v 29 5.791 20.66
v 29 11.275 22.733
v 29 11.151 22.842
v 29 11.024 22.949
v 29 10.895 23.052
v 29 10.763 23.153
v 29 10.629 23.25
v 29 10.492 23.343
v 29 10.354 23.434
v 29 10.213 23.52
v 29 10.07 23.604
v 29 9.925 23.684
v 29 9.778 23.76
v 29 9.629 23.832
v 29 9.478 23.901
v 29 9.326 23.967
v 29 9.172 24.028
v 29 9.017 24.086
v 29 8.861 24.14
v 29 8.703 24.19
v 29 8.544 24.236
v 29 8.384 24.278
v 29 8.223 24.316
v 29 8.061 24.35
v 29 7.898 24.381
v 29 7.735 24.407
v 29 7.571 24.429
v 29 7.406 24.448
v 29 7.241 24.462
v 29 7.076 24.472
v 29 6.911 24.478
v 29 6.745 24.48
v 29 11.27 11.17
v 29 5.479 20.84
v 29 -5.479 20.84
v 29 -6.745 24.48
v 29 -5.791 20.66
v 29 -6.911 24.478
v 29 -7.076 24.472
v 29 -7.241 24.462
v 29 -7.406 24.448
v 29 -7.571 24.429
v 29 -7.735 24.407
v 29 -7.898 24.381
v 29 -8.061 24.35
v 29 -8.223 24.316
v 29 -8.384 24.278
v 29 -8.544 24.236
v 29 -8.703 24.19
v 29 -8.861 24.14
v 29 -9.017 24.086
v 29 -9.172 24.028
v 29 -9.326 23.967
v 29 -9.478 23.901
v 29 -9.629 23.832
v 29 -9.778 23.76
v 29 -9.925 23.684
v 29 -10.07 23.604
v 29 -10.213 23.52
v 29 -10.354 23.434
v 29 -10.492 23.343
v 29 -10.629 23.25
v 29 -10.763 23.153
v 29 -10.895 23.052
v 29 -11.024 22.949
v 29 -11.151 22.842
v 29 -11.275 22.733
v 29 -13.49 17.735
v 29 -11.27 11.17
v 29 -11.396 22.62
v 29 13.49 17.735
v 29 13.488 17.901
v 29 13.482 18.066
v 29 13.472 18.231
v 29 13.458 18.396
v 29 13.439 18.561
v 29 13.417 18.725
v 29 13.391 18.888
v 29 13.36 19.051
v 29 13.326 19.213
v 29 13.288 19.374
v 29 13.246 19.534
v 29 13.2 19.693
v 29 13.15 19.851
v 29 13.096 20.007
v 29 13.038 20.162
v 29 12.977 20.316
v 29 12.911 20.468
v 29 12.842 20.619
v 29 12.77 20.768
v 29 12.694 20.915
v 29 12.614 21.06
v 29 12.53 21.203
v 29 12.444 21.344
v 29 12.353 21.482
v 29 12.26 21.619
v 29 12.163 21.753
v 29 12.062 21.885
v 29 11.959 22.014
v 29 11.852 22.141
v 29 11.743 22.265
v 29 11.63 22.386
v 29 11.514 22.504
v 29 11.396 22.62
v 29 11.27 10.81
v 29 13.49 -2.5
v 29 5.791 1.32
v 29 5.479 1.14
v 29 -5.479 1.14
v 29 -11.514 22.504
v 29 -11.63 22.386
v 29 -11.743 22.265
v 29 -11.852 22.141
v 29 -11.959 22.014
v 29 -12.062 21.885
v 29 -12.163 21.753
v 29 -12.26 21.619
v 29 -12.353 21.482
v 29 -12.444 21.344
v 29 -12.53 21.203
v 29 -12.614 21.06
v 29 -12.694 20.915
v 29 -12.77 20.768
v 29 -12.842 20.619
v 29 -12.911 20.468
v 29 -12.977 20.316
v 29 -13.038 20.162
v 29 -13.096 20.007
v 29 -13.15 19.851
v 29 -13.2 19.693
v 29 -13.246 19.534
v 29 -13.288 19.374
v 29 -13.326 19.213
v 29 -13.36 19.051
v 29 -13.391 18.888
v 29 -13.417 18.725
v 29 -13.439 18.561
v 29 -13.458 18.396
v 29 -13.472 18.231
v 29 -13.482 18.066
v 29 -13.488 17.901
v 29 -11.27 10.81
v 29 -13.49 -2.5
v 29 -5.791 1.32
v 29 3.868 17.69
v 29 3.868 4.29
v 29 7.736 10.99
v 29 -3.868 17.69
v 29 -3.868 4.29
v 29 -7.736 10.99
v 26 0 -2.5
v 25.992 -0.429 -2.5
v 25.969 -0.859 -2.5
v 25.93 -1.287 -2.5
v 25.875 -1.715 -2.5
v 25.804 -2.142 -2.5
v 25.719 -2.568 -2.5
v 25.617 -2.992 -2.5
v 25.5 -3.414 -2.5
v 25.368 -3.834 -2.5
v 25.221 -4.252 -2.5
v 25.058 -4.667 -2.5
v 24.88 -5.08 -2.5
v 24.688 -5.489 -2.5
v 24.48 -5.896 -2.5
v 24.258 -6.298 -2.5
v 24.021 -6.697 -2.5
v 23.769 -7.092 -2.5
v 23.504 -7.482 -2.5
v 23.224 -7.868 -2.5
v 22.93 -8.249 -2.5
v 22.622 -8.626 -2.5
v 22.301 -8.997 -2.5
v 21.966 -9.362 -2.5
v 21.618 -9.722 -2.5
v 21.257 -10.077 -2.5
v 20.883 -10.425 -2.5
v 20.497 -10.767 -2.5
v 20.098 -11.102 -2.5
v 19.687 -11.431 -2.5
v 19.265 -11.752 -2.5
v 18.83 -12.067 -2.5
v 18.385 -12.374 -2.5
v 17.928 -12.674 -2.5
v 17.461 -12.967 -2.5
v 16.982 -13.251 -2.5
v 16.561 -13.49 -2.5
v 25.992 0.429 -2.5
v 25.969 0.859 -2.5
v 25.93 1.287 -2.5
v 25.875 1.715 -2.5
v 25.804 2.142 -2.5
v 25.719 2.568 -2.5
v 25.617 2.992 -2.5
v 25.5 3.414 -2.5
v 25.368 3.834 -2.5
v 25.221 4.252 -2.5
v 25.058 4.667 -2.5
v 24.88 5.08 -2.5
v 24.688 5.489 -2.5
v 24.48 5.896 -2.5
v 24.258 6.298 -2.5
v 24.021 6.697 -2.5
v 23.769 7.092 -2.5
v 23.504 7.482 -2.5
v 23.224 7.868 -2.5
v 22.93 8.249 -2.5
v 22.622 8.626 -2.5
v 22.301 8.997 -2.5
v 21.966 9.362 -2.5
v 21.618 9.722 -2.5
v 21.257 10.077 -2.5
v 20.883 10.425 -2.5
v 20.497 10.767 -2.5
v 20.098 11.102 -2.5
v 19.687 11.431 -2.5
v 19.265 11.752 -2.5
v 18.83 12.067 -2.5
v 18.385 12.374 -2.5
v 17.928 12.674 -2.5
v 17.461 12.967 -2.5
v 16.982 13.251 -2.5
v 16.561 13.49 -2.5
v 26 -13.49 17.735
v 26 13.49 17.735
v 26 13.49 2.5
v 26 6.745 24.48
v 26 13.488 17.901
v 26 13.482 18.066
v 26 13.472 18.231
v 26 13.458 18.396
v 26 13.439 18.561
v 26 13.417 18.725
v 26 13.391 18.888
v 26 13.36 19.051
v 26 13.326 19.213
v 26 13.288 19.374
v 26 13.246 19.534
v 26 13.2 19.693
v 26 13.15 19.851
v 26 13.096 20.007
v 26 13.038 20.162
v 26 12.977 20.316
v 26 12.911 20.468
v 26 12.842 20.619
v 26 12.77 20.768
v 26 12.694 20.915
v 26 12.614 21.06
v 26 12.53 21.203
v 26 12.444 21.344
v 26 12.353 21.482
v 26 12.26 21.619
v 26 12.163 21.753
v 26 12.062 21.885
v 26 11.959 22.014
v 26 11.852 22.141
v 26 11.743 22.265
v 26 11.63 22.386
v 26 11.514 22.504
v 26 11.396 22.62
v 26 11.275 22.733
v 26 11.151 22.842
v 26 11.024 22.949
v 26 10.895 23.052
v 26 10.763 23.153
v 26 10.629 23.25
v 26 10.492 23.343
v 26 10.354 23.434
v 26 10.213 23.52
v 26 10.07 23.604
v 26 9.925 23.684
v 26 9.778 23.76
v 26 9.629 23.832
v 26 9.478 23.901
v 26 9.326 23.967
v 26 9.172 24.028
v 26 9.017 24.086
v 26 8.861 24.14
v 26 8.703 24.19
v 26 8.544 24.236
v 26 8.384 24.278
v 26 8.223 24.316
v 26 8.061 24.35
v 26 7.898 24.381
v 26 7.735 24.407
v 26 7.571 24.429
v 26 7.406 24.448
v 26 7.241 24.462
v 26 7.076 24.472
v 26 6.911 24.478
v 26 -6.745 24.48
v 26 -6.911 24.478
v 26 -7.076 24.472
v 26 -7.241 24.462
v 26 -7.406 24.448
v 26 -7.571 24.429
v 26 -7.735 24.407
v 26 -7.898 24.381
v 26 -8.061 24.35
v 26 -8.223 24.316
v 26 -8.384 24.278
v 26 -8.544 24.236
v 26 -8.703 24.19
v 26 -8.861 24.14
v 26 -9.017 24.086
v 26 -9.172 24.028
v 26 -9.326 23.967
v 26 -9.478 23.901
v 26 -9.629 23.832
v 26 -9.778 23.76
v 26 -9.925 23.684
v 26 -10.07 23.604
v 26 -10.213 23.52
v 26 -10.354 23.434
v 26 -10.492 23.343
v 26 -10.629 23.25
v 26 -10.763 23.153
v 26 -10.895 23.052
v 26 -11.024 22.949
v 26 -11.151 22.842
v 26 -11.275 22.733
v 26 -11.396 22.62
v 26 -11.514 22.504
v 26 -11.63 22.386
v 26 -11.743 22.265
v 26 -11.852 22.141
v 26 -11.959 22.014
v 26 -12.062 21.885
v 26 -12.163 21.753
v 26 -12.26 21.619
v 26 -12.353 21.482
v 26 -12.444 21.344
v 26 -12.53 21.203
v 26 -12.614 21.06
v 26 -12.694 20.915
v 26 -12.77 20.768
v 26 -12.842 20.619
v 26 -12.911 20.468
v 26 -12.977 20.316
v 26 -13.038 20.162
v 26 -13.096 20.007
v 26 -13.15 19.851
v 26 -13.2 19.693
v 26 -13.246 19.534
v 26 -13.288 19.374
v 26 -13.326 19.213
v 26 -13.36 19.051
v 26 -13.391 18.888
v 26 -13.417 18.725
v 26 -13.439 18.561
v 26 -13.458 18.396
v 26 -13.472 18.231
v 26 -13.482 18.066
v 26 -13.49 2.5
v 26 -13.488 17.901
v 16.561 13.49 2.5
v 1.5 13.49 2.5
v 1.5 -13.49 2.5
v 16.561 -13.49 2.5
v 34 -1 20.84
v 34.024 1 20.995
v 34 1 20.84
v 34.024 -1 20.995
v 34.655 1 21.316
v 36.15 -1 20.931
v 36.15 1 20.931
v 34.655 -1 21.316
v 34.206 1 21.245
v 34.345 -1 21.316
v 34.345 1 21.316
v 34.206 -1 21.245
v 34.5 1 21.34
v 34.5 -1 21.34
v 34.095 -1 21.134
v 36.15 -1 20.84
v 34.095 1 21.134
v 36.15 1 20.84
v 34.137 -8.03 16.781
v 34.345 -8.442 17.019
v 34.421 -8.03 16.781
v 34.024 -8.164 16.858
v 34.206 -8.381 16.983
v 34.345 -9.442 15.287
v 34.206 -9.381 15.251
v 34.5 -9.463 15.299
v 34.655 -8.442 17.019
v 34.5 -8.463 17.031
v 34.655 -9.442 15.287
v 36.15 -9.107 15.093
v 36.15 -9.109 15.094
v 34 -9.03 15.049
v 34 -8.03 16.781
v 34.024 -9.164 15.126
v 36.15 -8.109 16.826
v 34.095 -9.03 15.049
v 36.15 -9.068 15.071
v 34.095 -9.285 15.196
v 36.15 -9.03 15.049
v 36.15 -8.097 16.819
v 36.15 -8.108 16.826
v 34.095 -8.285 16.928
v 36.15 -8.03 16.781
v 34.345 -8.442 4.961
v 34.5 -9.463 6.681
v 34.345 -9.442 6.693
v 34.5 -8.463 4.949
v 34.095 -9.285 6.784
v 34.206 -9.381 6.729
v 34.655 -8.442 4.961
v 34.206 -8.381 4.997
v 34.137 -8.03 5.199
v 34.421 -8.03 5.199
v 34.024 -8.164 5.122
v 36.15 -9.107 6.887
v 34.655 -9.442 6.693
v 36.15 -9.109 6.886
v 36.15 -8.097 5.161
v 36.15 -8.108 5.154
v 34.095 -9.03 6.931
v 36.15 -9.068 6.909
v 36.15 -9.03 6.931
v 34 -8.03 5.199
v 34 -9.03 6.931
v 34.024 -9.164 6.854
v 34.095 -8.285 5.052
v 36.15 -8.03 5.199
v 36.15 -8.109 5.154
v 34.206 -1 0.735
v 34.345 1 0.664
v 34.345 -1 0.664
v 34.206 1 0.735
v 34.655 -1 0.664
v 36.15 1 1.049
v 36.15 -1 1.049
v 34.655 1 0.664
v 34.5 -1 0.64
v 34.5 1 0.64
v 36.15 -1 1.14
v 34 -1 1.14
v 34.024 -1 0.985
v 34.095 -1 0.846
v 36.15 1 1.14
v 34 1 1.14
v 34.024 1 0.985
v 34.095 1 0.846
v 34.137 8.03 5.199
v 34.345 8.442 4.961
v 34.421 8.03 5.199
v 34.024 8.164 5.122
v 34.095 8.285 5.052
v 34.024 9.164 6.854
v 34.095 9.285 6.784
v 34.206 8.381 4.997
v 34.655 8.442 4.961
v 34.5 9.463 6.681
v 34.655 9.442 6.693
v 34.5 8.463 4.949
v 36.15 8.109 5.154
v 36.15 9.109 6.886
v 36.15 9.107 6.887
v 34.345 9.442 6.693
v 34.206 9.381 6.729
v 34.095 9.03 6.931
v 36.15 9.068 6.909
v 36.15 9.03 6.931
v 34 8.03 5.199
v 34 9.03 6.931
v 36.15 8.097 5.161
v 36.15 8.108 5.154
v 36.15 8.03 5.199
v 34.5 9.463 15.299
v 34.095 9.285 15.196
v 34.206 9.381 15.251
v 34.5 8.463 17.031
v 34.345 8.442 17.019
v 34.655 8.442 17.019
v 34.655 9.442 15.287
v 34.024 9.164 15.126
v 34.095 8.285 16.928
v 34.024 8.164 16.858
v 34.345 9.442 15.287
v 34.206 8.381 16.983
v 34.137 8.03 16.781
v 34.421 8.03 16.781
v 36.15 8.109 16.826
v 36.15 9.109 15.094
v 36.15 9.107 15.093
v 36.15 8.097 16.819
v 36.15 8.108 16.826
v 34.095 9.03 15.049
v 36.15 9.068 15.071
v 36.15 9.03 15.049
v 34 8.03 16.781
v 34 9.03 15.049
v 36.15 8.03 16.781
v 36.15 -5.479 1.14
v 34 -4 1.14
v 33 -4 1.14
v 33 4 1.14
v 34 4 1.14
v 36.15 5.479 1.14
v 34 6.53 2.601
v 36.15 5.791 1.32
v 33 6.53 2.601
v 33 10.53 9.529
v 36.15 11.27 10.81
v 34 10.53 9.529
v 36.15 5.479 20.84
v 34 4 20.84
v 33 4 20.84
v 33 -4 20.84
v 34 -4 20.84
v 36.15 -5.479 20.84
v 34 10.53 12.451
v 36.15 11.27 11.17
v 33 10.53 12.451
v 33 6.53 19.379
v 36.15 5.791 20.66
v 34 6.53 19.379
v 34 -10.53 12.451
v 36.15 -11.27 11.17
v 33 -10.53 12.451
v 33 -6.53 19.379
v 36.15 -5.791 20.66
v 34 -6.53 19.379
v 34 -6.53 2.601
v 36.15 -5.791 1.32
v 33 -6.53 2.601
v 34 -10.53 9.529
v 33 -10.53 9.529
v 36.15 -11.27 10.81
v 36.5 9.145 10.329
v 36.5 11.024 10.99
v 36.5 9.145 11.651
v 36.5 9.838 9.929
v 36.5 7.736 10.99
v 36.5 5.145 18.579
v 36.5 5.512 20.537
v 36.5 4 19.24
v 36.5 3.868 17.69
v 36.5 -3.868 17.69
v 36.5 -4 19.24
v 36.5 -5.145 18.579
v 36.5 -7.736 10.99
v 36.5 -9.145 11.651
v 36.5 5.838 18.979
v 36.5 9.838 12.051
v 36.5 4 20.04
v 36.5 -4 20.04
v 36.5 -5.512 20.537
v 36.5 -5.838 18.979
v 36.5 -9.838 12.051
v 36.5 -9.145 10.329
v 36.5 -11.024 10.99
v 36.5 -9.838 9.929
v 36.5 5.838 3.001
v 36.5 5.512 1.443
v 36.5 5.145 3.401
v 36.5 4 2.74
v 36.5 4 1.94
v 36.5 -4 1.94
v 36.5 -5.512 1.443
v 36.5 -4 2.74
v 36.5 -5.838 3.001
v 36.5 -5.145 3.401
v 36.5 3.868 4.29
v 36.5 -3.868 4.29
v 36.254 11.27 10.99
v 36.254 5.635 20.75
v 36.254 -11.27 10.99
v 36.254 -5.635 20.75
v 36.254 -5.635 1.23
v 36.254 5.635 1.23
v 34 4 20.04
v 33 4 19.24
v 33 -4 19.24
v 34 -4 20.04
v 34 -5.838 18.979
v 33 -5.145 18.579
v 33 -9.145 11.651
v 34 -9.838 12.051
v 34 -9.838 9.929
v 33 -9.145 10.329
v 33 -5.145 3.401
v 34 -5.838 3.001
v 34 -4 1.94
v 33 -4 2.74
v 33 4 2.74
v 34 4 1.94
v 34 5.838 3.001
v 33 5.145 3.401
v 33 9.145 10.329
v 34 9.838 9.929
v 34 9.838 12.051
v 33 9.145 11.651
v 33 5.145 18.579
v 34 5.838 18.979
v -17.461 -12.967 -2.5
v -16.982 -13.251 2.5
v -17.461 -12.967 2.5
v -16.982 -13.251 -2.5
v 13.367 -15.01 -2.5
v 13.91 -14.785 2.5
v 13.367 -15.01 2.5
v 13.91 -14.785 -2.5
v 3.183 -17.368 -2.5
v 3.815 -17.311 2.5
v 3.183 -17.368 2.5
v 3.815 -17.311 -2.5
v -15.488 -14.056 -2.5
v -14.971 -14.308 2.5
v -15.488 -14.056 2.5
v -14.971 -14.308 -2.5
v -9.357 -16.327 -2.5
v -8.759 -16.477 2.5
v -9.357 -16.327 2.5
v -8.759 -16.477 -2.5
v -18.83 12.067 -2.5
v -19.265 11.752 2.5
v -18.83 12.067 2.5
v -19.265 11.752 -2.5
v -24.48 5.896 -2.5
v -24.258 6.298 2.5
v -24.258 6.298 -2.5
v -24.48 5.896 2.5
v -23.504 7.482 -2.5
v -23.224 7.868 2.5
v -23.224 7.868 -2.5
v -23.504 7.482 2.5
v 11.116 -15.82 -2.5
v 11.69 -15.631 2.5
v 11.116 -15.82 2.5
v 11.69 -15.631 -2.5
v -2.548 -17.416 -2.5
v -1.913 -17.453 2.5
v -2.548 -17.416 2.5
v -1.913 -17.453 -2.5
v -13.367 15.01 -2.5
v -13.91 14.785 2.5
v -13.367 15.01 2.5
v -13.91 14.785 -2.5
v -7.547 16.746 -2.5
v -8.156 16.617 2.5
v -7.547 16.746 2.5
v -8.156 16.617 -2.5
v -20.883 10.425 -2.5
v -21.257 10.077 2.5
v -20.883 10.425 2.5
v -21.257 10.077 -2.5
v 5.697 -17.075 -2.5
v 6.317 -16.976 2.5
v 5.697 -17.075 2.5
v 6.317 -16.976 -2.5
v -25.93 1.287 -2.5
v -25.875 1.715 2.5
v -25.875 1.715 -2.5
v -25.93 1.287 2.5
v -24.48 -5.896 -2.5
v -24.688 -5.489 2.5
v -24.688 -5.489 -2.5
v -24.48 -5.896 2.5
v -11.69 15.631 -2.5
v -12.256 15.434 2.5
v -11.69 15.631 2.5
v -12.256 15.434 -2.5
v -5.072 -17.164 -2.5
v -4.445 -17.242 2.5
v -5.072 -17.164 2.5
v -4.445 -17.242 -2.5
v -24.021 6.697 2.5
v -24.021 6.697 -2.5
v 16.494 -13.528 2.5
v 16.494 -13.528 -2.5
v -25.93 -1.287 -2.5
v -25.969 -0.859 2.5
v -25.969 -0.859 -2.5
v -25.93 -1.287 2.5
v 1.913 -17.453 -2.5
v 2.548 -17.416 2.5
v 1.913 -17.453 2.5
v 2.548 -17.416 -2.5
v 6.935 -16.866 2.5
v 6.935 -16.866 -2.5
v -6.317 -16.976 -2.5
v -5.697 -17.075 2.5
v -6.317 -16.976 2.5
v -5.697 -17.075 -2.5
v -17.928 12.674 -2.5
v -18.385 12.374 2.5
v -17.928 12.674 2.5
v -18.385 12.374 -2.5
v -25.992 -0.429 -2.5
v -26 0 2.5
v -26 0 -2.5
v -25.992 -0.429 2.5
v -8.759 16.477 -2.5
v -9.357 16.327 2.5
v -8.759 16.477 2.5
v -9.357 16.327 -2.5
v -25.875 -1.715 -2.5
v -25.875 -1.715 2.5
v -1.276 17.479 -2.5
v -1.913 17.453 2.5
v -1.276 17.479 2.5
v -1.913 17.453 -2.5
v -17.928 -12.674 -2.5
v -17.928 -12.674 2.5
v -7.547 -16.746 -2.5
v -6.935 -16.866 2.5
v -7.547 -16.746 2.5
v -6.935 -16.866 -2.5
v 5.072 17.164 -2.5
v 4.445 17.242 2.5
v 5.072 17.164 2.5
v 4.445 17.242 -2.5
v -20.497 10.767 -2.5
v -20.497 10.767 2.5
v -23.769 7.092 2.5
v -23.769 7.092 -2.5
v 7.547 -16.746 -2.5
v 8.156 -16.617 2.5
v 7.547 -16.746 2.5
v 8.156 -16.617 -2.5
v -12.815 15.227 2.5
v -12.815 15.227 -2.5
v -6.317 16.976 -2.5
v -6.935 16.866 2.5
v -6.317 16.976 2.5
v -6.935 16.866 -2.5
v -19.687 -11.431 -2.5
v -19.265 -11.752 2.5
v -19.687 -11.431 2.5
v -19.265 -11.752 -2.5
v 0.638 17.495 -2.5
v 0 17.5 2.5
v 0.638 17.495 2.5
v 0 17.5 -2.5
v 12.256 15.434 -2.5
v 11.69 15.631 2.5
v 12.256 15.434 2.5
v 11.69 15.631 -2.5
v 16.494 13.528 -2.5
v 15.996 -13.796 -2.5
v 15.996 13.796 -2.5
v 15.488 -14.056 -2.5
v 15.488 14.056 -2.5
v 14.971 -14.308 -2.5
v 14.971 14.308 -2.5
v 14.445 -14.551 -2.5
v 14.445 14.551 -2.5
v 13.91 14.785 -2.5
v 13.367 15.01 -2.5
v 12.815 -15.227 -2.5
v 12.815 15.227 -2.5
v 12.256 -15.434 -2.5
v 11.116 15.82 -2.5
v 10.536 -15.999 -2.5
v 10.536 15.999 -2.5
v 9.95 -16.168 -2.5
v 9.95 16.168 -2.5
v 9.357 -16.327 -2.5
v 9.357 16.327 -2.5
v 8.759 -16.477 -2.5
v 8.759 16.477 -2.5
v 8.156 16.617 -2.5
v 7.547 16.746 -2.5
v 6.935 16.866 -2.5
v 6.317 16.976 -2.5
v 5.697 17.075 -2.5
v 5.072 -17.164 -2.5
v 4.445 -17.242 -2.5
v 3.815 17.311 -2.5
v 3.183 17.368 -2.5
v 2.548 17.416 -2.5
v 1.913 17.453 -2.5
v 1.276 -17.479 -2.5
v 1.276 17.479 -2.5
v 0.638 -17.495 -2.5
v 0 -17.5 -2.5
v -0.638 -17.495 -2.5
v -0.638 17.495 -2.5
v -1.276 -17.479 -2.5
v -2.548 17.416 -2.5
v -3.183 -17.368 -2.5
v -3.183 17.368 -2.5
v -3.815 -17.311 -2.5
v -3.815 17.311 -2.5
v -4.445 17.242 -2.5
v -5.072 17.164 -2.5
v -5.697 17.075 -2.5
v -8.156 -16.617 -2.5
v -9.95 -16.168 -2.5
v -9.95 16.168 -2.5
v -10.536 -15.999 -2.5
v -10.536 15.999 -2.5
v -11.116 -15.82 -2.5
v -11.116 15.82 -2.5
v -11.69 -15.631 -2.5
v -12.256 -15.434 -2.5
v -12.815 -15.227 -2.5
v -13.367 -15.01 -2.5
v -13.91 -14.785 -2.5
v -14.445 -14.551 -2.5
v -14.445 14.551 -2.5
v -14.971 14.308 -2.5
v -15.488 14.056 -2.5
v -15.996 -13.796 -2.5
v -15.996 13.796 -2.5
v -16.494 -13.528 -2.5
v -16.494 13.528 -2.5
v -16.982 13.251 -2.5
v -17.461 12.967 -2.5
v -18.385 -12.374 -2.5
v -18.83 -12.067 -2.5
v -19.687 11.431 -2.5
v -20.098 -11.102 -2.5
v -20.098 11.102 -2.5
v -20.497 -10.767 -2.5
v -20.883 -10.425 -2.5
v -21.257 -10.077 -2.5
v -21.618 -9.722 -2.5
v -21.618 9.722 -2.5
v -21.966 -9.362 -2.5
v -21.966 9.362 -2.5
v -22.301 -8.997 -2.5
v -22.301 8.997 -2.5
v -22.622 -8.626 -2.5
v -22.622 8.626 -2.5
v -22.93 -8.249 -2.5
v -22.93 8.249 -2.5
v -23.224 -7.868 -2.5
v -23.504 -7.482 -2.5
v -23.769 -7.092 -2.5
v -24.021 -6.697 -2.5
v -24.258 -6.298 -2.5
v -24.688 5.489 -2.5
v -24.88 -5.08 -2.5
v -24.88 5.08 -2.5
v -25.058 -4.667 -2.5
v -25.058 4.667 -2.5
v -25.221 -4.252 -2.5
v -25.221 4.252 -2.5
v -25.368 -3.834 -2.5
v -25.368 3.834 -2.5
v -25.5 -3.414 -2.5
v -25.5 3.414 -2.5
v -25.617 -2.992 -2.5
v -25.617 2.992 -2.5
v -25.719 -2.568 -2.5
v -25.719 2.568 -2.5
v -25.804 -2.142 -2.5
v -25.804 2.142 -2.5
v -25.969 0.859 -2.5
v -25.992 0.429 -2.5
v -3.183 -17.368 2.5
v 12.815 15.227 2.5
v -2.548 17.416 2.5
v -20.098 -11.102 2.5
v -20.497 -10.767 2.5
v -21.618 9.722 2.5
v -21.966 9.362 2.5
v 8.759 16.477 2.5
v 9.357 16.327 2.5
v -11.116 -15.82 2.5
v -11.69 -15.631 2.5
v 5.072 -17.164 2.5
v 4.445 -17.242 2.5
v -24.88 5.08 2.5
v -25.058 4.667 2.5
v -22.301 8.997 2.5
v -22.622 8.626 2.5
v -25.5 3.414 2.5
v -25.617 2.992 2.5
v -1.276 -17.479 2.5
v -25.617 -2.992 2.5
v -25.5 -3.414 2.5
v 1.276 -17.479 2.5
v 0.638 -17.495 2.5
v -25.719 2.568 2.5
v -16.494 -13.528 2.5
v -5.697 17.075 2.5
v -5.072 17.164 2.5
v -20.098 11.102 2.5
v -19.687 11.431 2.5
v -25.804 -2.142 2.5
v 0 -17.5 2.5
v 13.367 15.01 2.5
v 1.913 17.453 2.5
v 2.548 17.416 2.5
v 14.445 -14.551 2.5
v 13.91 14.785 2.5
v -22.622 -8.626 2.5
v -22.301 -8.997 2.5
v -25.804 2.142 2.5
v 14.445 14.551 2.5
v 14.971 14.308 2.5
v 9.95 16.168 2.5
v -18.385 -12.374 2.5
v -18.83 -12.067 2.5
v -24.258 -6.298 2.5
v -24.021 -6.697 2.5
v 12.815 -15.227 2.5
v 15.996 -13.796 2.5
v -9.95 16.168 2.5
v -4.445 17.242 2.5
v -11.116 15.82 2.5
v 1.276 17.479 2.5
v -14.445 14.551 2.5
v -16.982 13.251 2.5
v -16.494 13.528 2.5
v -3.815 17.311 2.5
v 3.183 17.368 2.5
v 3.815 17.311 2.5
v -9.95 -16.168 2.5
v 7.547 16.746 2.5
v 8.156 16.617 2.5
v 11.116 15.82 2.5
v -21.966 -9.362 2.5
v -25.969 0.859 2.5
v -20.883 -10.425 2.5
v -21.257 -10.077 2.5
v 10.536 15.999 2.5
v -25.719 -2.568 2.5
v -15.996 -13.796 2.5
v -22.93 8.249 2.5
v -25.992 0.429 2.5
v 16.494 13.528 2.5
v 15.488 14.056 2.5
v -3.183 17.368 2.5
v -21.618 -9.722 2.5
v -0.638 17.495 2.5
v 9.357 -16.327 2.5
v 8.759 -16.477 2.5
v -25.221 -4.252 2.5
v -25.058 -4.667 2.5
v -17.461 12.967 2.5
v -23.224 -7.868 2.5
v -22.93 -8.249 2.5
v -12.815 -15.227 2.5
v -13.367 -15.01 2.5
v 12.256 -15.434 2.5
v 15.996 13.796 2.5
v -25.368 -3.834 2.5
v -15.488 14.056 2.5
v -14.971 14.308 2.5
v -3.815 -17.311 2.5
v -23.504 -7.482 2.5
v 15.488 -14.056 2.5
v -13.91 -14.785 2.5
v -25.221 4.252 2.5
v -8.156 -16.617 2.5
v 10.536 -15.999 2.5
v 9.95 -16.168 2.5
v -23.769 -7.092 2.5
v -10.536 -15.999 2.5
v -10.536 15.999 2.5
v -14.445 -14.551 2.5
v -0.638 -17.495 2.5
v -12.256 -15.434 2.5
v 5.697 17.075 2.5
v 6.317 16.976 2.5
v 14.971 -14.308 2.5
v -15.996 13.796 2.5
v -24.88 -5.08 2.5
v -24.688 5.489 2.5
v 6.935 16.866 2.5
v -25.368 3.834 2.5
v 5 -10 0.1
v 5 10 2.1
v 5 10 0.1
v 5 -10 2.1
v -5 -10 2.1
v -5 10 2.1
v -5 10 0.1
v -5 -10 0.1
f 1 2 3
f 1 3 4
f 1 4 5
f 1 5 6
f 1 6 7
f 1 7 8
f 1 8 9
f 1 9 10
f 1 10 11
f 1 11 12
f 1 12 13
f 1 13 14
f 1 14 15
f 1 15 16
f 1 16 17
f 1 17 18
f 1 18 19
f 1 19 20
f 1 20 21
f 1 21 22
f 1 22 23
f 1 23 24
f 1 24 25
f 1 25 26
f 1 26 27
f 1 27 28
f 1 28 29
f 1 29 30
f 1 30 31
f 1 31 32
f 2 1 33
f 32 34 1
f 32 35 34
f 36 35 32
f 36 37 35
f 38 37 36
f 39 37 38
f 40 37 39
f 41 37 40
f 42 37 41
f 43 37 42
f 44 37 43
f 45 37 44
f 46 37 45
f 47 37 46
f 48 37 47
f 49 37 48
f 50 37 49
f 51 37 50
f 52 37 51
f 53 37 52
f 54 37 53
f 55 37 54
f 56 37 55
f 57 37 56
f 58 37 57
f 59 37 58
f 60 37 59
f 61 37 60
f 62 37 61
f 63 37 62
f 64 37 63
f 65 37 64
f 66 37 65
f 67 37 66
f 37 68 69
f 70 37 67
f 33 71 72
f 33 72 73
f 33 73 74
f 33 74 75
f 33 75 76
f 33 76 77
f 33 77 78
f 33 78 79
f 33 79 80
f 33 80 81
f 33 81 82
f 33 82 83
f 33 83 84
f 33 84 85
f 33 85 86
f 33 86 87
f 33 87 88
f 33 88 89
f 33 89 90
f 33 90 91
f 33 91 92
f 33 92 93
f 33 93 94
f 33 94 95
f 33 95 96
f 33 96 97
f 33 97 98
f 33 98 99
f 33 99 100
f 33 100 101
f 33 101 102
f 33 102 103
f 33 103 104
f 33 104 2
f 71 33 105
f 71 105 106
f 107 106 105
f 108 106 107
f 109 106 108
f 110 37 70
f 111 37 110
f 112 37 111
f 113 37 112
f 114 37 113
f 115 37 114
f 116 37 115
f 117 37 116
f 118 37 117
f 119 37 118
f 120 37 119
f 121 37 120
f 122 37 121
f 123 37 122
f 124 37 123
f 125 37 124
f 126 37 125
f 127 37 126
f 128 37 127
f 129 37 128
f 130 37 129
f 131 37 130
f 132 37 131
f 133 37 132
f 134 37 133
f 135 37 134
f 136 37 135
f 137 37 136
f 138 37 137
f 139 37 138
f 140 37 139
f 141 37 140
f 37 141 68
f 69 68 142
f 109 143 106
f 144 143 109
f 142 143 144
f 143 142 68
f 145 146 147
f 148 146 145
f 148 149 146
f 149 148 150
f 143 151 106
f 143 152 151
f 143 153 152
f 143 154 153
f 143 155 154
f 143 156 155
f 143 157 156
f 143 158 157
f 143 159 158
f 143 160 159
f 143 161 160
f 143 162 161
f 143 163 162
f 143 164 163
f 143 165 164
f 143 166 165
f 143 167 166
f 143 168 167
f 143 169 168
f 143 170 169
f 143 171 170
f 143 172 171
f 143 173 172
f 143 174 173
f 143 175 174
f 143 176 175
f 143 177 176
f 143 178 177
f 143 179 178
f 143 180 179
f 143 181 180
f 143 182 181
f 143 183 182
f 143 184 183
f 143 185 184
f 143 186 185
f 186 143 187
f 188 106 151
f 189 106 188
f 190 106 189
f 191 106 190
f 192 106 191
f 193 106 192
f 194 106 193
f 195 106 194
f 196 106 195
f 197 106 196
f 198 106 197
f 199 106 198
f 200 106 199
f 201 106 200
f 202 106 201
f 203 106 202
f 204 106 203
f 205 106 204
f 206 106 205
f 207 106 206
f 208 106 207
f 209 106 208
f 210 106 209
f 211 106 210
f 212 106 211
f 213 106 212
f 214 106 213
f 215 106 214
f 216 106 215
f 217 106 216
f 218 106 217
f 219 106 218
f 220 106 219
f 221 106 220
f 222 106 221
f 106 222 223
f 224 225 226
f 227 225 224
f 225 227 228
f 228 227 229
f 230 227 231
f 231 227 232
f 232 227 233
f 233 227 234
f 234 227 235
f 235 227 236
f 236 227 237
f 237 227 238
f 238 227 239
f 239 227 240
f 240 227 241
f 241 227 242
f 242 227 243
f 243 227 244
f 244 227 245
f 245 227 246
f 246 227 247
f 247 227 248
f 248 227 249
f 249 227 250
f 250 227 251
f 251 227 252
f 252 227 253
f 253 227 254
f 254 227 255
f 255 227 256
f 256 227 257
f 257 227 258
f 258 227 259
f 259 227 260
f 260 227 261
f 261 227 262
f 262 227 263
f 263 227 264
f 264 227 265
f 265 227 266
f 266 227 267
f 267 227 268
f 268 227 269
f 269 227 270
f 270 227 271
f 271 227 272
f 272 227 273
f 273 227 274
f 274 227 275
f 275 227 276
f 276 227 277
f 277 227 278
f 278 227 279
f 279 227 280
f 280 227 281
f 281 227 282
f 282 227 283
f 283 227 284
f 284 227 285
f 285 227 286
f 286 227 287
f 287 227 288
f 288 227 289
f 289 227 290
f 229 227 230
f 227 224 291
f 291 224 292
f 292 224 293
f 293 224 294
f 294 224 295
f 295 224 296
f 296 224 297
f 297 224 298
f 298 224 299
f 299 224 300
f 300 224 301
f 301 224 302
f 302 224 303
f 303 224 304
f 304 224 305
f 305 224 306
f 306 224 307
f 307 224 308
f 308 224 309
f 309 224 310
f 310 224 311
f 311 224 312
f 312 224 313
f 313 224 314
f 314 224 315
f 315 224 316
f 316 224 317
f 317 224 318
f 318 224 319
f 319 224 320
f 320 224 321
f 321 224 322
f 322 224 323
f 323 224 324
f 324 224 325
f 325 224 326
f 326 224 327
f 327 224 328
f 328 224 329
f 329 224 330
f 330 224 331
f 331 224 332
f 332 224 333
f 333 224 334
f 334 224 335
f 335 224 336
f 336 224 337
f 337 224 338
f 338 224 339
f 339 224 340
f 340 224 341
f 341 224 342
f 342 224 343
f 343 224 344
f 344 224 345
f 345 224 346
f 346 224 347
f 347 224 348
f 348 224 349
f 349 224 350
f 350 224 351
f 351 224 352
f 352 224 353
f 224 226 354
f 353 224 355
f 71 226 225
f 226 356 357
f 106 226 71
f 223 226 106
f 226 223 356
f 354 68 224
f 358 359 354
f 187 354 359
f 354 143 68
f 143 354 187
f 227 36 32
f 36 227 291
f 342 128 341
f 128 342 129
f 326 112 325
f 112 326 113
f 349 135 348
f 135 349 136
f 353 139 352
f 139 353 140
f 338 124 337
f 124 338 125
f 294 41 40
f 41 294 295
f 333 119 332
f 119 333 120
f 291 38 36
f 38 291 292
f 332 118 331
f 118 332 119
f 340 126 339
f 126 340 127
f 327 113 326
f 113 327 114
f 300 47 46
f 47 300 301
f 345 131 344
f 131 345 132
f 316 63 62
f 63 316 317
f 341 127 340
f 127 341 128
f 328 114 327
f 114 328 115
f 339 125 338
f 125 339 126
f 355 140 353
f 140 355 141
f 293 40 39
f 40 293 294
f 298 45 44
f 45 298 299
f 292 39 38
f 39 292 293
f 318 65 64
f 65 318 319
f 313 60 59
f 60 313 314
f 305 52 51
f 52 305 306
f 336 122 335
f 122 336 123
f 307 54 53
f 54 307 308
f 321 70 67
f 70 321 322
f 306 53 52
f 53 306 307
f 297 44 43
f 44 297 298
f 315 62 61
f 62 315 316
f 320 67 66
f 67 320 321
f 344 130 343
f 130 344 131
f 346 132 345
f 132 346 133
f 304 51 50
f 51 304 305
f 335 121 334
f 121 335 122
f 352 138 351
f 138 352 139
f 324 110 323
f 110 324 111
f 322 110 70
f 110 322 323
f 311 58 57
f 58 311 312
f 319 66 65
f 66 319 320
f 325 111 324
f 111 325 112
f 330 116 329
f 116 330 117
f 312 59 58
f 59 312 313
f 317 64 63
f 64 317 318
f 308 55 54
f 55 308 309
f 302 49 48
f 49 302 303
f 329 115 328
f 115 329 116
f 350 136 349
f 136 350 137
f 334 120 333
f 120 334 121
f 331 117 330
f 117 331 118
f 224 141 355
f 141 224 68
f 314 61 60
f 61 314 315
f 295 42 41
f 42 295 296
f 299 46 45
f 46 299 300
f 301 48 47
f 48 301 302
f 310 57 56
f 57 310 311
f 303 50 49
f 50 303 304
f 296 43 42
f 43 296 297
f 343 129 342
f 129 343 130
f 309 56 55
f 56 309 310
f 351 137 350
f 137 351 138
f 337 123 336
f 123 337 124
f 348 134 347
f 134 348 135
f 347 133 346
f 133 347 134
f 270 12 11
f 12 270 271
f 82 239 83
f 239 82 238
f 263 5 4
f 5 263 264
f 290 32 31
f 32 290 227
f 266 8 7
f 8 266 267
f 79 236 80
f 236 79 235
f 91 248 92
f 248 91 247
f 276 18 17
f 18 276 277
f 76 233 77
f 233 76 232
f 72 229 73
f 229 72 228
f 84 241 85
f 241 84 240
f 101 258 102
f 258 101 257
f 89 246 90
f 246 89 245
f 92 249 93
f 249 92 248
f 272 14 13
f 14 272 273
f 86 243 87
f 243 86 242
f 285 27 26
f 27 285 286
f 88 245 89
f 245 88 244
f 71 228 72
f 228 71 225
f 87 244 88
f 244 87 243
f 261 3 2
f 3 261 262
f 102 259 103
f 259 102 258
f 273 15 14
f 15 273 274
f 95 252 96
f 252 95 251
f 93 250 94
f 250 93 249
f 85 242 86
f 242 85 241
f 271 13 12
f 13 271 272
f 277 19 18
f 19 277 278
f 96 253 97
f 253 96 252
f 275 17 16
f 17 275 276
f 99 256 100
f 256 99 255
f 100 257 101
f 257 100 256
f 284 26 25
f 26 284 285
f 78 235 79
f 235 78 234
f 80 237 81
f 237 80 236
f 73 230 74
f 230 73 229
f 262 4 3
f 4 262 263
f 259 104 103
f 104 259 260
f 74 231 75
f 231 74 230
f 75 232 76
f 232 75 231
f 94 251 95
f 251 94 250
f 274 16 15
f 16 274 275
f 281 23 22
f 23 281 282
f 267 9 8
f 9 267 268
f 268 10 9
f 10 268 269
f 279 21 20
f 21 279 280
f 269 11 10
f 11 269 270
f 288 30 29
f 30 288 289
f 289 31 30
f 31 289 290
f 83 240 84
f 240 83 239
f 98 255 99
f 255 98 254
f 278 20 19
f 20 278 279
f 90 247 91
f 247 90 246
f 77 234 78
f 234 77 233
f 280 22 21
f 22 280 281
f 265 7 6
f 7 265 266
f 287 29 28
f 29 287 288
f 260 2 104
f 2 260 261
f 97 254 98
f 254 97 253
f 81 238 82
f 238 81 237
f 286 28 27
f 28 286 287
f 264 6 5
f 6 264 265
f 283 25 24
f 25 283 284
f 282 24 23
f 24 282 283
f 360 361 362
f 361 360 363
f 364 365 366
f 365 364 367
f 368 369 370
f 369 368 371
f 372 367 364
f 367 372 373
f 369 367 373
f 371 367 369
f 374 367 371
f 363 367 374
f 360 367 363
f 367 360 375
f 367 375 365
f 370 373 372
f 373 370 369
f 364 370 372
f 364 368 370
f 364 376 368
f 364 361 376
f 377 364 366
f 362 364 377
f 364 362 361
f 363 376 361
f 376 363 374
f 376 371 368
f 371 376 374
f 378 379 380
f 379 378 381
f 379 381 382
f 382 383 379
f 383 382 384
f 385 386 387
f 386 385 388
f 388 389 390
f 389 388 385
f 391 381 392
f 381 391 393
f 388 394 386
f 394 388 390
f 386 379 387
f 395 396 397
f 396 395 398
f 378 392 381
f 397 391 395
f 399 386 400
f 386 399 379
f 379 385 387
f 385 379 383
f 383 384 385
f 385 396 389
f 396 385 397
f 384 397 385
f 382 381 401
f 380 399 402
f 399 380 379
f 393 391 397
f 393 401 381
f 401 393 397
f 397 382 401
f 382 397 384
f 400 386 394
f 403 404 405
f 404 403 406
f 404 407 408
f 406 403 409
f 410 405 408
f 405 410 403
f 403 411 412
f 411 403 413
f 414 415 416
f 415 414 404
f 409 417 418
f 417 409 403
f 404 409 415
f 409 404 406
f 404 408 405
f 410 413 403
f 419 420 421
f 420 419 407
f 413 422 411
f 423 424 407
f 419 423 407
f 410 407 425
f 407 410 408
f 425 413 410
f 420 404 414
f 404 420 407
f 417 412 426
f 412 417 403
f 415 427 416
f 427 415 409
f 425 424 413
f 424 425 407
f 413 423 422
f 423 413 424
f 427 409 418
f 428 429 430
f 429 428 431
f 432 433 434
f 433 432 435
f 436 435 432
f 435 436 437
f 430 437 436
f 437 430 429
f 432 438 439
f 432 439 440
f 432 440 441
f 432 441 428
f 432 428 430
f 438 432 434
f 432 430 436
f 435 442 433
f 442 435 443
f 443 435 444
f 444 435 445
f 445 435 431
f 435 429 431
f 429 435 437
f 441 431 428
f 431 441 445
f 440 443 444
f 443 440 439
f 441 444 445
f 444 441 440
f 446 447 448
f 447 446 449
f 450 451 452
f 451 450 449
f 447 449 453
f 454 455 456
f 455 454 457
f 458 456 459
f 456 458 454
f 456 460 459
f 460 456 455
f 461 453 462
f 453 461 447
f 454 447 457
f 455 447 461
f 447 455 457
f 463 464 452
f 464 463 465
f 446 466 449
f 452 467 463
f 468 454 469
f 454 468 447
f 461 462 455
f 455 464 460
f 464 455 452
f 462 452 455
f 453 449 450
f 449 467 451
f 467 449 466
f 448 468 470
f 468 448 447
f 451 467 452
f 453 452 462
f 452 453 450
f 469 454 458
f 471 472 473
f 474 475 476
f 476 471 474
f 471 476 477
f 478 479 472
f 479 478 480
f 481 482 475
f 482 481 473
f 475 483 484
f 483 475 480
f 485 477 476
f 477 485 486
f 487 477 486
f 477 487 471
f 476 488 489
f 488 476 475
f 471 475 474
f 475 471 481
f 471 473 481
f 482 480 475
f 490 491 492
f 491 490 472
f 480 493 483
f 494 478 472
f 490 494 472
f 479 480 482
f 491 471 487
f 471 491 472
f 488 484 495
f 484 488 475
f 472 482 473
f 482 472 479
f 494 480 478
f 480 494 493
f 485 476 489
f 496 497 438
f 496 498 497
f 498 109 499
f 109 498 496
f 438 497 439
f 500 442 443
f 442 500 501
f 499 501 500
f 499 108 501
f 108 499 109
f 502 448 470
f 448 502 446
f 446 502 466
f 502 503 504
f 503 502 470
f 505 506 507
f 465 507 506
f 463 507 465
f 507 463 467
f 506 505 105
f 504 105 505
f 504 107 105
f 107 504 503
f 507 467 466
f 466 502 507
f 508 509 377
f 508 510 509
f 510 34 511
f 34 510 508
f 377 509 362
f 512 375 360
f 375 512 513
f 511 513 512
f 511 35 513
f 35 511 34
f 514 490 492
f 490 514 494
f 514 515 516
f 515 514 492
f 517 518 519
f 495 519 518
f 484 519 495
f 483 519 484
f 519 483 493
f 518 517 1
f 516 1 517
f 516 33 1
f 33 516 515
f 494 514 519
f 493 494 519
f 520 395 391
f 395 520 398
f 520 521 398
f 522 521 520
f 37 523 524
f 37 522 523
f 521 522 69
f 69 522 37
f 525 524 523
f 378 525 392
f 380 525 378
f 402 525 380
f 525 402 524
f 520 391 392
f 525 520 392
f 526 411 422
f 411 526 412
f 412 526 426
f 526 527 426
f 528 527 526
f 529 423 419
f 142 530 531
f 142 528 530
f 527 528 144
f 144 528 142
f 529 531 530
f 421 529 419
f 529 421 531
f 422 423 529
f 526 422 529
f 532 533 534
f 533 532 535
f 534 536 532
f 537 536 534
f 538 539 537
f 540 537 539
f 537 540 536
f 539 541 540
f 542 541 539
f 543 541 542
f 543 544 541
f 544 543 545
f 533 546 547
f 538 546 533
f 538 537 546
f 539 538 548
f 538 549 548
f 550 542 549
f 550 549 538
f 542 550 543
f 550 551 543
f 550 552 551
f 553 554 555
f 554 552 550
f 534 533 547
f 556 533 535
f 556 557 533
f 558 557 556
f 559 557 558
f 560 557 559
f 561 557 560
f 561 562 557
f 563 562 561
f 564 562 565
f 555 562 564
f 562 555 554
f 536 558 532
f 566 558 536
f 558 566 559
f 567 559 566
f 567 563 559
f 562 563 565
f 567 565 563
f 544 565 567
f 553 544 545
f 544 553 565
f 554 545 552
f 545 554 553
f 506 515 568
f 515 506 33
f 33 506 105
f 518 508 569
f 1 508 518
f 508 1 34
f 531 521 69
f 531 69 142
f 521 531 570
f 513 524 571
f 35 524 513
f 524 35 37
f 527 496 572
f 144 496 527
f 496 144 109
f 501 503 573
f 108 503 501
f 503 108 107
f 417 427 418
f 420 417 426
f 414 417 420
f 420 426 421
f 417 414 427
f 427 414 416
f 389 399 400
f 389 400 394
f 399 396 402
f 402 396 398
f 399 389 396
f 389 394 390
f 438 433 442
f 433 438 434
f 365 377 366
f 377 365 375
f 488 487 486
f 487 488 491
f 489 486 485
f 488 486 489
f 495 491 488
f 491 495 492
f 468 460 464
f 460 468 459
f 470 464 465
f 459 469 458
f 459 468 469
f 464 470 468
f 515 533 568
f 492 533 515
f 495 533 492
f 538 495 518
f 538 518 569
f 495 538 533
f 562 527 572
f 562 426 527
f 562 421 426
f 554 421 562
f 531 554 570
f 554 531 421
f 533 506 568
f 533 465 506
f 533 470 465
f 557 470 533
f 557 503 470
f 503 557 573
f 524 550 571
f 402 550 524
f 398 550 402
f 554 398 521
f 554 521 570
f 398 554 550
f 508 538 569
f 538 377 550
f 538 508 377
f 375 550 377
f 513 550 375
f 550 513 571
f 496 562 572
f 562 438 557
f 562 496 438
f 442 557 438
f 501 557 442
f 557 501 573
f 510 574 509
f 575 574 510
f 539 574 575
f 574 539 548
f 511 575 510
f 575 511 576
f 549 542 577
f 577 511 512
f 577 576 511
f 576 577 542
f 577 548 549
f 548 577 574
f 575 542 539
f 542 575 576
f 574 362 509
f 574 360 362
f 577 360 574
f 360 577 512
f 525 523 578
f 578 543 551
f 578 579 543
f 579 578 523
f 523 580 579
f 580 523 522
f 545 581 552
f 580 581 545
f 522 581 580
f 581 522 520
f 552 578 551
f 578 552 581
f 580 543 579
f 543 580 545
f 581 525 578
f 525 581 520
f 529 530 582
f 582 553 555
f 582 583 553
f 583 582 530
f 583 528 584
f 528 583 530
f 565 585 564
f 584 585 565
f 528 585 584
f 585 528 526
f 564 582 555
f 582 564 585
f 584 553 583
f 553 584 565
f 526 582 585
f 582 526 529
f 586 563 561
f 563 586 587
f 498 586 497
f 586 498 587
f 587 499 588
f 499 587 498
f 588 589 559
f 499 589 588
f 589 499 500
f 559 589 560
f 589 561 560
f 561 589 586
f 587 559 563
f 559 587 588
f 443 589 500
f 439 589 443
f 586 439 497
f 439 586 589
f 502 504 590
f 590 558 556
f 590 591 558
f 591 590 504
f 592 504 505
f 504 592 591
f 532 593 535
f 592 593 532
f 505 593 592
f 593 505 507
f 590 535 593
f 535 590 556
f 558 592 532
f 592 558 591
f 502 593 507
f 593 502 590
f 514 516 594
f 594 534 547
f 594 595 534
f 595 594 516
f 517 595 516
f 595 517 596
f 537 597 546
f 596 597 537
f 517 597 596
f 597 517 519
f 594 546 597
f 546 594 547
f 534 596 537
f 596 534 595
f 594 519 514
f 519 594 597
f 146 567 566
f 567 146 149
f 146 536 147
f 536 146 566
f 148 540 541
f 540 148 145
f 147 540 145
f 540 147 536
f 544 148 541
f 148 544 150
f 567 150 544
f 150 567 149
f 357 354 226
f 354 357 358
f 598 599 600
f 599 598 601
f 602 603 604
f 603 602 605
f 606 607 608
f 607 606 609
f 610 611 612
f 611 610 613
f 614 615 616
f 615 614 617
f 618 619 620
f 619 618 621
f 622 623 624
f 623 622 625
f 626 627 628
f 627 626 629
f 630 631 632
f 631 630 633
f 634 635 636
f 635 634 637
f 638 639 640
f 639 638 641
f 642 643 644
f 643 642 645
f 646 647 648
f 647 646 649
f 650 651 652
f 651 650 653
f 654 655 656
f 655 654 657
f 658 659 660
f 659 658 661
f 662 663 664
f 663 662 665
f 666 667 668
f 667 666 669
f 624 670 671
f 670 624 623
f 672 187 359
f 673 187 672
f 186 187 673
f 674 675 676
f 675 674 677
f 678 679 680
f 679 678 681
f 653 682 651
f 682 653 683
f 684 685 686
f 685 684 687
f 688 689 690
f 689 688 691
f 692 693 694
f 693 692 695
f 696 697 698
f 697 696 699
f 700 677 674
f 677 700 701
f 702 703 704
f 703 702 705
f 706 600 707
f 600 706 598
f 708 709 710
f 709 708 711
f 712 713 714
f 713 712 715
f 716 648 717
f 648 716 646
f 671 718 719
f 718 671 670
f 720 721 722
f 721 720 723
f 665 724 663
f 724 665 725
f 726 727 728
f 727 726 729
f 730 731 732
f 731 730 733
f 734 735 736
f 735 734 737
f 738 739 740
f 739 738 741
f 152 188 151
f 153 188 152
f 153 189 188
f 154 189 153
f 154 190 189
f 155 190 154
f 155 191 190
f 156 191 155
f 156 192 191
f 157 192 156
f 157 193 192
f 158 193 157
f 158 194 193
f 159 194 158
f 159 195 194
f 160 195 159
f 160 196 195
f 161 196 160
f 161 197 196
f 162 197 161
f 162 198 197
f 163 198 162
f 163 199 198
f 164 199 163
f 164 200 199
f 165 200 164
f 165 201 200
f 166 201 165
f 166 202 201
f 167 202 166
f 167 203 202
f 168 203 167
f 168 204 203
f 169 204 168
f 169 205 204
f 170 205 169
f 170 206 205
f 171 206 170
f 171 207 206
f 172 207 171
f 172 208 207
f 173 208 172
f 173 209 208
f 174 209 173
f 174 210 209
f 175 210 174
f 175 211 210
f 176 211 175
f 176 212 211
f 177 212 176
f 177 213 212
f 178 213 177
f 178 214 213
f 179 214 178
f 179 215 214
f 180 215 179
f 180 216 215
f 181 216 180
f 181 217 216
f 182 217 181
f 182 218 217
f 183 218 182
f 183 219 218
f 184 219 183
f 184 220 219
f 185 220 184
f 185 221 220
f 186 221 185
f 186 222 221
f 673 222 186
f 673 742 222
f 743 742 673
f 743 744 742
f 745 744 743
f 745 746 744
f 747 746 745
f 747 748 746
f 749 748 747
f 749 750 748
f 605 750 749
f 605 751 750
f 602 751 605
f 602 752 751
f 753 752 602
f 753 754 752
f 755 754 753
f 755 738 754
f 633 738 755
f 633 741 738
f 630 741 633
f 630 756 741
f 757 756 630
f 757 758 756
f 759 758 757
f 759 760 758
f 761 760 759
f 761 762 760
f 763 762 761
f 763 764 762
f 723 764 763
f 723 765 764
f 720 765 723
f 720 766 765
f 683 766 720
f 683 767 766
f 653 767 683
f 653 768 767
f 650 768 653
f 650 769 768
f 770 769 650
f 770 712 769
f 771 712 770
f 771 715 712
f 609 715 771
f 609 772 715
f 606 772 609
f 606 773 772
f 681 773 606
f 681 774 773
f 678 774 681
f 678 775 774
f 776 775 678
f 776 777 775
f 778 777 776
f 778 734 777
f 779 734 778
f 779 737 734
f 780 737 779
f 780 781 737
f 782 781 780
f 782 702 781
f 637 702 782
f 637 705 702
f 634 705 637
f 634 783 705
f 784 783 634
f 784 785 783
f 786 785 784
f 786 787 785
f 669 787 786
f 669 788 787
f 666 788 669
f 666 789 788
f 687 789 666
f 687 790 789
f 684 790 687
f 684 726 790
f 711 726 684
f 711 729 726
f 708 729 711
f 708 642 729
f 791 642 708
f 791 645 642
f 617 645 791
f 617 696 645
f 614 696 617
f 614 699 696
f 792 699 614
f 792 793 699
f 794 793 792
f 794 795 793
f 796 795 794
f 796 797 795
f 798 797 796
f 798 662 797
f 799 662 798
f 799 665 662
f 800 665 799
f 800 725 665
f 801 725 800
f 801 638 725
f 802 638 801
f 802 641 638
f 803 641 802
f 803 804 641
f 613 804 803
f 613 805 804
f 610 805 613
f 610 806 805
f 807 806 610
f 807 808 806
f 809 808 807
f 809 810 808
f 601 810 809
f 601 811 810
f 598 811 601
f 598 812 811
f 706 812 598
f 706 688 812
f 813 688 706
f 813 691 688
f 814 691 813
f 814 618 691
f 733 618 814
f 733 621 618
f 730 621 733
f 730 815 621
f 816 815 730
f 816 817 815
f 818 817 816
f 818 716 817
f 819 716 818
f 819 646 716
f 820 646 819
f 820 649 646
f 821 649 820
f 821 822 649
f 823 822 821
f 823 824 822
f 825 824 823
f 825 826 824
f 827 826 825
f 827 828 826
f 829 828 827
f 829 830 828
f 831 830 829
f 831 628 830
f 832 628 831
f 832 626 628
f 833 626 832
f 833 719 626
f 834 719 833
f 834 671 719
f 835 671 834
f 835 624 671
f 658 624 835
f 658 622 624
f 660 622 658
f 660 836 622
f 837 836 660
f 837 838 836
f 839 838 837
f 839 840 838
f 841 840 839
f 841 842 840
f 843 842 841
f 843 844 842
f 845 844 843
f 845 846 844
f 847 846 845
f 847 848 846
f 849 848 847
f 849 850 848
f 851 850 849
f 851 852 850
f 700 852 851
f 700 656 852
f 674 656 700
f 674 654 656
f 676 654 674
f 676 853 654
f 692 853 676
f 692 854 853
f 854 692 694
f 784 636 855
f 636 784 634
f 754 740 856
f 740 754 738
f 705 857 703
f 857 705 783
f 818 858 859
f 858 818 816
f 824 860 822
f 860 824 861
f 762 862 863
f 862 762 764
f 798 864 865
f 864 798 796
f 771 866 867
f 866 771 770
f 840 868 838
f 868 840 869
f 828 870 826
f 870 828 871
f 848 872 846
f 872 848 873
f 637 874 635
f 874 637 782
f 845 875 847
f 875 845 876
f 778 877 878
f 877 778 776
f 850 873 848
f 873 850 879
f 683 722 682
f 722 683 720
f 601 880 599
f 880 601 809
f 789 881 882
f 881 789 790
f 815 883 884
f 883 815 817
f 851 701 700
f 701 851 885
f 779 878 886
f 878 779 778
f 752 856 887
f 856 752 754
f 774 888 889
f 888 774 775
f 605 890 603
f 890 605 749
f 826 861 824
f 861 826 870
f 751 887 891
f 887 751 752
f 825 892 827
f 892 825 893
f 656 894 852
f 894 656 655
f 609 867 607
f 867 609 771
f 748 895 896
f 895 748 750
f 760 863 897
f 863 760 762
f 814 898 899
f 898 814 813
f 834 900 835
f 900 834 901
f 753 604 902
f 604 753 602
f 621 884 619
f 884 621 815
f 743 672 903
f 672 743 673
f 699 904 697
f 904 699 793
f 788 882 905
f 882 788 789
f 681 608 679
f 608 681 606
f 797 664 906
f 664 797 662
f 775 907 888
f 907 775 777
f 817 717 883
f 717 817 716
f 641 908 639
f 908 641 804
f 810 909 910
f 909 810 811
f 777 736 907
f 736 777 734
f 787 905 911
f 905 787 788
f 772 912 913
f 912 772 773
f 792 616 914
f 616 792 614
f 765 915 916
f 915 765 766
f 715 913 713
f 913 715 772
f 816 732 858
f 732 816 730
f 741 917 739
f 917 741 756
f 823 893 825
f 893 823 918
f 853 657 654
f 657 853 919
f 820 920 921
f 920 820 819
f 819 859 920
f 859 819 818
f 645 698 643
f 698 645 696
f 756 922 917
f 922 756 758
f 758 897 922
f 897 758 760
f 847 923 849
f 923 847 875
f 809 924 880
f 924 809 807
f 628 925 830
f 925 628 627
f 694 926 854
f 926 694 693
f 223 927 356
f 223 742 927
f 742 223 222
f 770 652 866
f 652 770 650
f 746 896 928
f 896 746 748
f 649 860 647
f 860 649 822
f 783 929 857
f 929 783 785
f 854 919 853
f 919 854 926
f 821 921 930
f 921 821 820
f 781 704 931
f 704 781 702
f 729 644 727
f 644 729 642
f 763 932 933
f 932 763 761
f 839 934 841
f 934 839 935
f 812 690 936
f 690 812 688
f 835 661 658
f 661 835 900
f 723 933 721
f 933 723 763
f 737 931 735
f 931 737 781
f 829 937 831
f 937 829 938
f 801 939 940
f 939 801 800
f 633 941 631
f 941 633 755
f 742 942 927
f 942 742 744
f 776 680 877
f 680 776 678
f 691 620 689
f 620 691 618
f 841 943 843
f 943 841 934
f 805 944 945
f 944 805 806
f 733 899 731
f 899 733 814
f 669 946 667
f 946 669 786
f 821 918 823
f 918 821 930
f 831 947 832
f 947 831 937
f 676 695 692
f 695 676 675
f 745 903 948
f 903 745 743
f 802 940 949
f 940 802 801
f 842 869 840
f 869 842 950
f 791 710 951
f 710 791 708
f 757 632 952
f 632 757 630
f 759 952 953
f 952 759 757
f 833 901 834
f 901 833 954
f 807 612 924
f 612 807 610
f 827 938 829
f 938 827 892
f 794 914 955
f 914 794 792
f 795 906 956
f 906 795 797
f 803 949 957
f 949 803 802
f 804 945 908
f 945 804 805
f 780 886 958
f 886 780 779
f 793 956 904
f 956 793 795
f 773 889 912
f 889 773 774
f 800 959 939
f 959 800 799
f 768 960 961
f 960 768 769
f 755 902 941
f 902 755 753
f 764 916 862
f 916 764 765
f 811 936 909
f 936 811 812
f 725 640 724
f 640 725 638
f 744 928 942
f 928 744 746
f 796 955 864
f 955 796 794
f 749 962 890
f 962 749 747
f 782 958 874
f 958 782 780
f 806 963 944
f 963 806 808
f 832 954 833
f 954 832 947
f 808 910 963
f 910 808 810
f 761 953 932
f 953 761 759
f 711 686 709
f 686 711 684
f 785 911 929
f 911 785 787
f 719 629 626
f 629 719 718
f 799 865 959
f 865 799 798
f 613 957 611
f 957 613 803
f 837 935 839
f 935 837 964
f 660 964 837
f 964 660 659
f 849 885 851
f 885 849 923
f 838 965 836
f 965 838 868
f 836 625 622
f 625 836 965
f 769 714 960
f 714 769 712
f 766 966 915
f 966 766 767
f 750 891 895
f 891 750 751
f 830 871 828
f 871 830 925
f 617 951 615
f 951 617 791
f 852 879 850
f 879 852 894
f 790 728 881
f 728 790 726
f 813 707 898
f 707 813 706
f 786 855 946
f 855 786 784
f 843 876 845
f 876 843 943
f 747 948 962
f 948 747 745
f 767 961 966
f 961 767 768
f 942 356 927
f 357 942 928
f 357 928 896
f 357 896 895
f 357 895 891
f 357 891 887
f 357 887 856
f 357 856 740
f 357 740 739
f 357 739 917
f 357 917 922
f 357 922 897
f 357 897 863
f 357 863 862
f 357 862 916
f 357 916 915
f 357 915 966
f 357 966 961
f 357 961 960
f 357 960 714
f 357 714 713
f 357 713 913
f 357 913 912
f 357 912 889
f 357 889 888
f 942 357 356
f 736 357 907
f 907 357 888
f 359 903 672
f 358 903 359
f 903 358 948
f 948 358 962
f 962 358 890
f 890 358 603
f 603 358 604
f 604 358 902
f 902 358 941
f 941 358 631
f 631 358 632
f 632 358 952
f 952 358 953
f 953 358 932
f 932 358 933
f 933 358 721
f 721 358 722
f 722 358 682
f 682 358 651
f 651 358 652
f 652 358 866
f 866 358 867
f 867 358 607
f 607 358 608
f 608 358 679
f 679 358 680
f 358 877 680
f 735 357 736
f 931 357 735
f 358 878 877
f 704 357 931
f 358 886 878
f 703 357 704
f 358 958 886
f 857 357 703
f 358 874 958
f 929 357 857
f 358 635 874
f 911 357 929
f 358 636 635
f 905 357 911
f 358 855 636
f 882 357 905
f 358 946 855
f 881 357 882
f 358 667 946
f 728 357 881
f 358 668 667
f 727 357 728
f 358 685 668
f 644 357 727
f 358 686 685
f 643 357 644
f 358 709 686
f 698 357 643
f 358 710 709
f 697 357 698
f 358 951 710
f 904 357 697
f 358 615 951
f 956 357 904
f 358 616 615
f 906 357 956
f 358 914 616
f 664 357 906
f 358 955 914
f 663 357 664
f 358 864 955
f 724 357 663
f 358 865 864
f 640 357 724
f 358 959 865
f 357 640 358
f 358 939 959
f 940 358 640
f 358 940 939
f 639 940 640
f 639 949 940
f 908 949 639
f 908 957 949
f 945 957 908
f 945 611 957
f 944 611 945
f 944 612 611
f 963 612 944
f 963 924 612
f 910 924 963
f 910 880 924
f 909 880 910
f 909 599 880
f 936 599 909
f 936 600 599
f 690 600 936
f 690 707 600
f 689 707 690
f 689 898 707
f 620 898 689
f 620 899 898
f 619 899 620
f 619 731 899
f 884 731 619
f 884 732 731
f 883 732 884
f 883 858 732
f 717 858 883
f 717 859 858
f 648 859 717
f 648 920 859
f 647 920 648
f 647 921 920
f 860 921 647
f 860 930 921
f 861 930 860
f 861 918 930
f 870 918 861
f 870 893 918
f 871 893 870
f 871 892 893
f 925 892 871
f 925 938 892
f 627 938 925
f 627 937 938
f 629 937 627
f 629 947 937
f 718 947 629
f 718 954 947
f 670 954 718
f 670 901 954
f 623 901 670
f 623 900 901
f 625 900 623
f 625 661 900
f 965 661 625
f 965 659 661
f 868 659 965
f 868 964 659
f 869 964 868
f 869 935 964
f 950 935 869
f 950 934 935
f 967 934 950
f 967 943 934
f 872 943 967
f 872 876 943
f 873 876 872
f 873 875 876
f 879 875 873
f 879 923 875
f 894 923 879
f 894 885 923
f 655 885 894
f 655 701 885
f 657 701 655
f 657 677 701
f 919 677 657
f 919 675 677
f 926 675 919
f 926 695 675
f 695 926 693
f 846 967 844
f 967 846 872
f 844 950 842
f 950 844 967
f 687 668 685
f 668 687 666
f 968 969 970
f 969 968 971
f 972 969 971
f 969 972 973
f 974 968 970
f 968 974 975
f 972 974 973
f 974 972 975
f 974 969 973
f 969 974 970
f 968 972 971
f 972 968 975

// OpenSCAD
/*
Customizable worklight holder with magnet for Honeycomb storage wall.
Can be use for store various things with magnet or metal plate.
*/

include<hex plug library.scad>;

/* [Plate dimensions and configuration] */
Plate_length = 52;
Plate_width = 35;
Plate_thickness = 5;
Plate_shape = 0; // [0:Oval, 1:Rectangle, 2:Rounded rectangle]

/* [Magnet dimensions and configuration] */
Magnet_width = 10;
Magnet_thickness = 2;
Magnet_Length = 20;
Distance_magnet_under_plate_surface = 0.4;
Magnet_shape = 0; // [0:Rectangle, 1:Circle - use width, 2:Oval, 3:None]

/* [Mount to wall configuration] */
Wall_mount_thickness = 3;
HSW_attach_type = 0; // [0:Insert, 1:Hexagon, 2:M3, 3:M4 ]

/* [Debug magent mode on/off] */
Debug_magnet_mode = false;

module __Customizer_Limit__ () {}  // end of parameters section
$fn = 256; // render quality

PLATE_SHAPE_OVAL = 0;
PLATE_SHAPE_RECTANGLE = 1;
PLATE_SHAPE_ROUNDED_RECTANGLE = 2;

plateLength = Plate_length;
plateWidth = Plate_width;
plateThickness = Plate_thickness;

RECTANGLE_MAGNET = 0;
CIRCLE_MAGNET = 1;
OVAL_MAGNET = 2;

magnetWidth = Magnet_width;
magnetThickness = Magnet_thickness;
magnetLength = Magnet_Length;
magnetUnderPlateSurface = Distance_magnet_under_plate_surface;

HSW_INSERT = 0;
HSW_HEXAGON = 1;
HSW_M3 = 2;
HSW_M4 = 3;

wallMountThickness = Wall_mount_thickness;
wallMountAttachType = HSW_attach_type;

// Render starts here
if ( !Debug_magnet_mode ) {
    difference() {
        plateWithMount();
        magnet();
    }    
}else{
    // debug mode here
    difference() {
        plate();
        scale([0.95, 0.95, 1.1]) plate();
    }    
    magnet();
}

module plate() {
    if (Plate_shape == PLATE_SHAPE_OVAL) {
        resize([plateLength, plateWidth]) 
            cylinder(plateThickness, plateWidth, plateWidth, true);
    } 
    if (Plate_shape == PLATE_SHAPE_RECTANGLE) {
        cube([plateLength, plateWidth, plateThickness], true);
    } 
    if (Plate_shape == PLATE_SHAPE_ROUNDED_RECTANGLE) {
        roundedRadius = min(plateLength / 4, plateWidth / 4);
        union() {
            cube([plateLength, plateWidth - roundedRadius * 2, plateThickness], true);
            cube([plateLength - roundedRadius * 2, plateWidth, plateThickness], true);
            moveX = plateLength / 2 - roundedRadius;
            moveY = plateWidth / 2 - roundedRadius;
            moveZ = -plateThickness / 2;
            translate([moveX, moveY, moveZ])
                cylinder(plateThickness, r = roundedRadius, true);
            translate([-moveX, moveY, moveZ])
                cylinder(plateThickness, r = roundedRadius, true);
            translate([moveX, -moveY, moveZ])
                cylinder(plateThickness, r = roundedRadius, true);
            translate([-moveX, -moveY, moveZ])
                cylinder(plateThickness, r = roundedRadius, true);
        }
    }
}

module wallMount() {
    insertMaxWidth = 25.98;
    spacer = 0.5;
    wallMountWidth = max( plateWidth / 2, insertMaxWidth + spacer * 2);
    wallMountHeight = wallMountWidth;
    
    translate([wallMountThickness / 2, 0, wallMountHeight / 2 - plateThickness / 2]) {
        difference() {
            verticalWallMount(wallMountWidth, wallMountHeight);
            if ( wallMountAttachType == HSW_M3 ) {
                rotate([0, 0, 90])
                    rotate([90, 0, 0])
                        cylinder(h = wallMountThickness * 2, d = 3.1, center = true);
            }
            if ( wallMountAttachType == HSW_M4 ) {
                rotate([0, 0, 90])
                    rotate([90, 0, 0])
                        cylinder( h = wallMountThickness * 2, d = 4.1, center = true);
            }
        }
        plateToWallMountConnector(wallMountWidth, wallMountHeight);
        hswAttach();        
    }
}

module verticalWallMount(wallMountWidth, wallMountHeight) {
    union() {
        translate([-wallMountThickness / 2, 0, 0]) {
            translate([0, -wallMountWidth / 2, -wallMountHeight / 2]) 
                cube([wallMountThickness, wallMountWidth, wallMountHeight * 3 / 4], false);
            translate([0, -wallMountWidth / 4, wallMountHeight / 4]) 
                cube([wallMountThickness, wallMountWidth / 2, wallMountHeight * 1 / 4], false);
            translate([0, -wallMountWidth / 4, wallMountHeight / 4]) 
                rotate([0, 90, 0])
                    cylinder(wallMountThickness, wallMountWidth / 4, wallMountWidth / 4);
            translate([0, wallMountWidth / 4, wallMountHeight / 4]) 
                rotate([0, 90, 0])
                    cylinder(wallMountThickness, wallMountWidth / 4, wallMountWidth / 4);
        }
    }    
}

module plateToWallMountConnector(wallMountWidth, wallMountHeight) {
    wallMountToPlateLength = plateLength / 2;
    translate([
        -wallMountToPlateLength / 2, 
        0, 
        -wallMountHeight / 2 + plateThickness / 2
    ]) 
        cube([wallMountToPlateLength, wallMountWidth, plateThickness], true);
}

module hswAttach() {
    translate([wallMountThickness / 2 - 2.5, 0, 0]) {
        if ( wallMountAttachType == HSW_HEXAGON ) {
            rotate([0, 0, 90])
                rotate([90, 0, 0])
                    hexagon_plug();            
        }
        if ( wallMountAttachType == HSW_INSERT ) {
            rotate([0, 0, 90])
                rotate([90, 0, 0])
                    insert_with_plate();            
        }
    }
}

module plateWithMount(){
    plate();
    translate([plateLength / 2, 0, 0]) wallMount();
}

module magnet() {
    magnetMoveZ = (plateThickness - magnetThickness) / 2 - magnetUnderPlateSurface;
    
    if (Magnet_shape == RECTANGLE_MAGNET) {
        translate([0, 0, magnetMoveZ])
            cube([magnetWidth,magnetLength,magnetThickness], true);
    }
    if (Magnet_shape == CIRCLE_MAGNET) {
        translate([0, 0, magnetMoveZ])
            cylinder(h = magnetThickness, d = magnetWidth, center = true);
    }
    if (Magnet_shape == OVAL_MAGNET) {
        translate([0, 0, magnetMoveZ])
            resize([magnetWidth, magnetLength])
                cylinder(h = magnetThickness, d = magnetWidth, center = true);
    }
}
